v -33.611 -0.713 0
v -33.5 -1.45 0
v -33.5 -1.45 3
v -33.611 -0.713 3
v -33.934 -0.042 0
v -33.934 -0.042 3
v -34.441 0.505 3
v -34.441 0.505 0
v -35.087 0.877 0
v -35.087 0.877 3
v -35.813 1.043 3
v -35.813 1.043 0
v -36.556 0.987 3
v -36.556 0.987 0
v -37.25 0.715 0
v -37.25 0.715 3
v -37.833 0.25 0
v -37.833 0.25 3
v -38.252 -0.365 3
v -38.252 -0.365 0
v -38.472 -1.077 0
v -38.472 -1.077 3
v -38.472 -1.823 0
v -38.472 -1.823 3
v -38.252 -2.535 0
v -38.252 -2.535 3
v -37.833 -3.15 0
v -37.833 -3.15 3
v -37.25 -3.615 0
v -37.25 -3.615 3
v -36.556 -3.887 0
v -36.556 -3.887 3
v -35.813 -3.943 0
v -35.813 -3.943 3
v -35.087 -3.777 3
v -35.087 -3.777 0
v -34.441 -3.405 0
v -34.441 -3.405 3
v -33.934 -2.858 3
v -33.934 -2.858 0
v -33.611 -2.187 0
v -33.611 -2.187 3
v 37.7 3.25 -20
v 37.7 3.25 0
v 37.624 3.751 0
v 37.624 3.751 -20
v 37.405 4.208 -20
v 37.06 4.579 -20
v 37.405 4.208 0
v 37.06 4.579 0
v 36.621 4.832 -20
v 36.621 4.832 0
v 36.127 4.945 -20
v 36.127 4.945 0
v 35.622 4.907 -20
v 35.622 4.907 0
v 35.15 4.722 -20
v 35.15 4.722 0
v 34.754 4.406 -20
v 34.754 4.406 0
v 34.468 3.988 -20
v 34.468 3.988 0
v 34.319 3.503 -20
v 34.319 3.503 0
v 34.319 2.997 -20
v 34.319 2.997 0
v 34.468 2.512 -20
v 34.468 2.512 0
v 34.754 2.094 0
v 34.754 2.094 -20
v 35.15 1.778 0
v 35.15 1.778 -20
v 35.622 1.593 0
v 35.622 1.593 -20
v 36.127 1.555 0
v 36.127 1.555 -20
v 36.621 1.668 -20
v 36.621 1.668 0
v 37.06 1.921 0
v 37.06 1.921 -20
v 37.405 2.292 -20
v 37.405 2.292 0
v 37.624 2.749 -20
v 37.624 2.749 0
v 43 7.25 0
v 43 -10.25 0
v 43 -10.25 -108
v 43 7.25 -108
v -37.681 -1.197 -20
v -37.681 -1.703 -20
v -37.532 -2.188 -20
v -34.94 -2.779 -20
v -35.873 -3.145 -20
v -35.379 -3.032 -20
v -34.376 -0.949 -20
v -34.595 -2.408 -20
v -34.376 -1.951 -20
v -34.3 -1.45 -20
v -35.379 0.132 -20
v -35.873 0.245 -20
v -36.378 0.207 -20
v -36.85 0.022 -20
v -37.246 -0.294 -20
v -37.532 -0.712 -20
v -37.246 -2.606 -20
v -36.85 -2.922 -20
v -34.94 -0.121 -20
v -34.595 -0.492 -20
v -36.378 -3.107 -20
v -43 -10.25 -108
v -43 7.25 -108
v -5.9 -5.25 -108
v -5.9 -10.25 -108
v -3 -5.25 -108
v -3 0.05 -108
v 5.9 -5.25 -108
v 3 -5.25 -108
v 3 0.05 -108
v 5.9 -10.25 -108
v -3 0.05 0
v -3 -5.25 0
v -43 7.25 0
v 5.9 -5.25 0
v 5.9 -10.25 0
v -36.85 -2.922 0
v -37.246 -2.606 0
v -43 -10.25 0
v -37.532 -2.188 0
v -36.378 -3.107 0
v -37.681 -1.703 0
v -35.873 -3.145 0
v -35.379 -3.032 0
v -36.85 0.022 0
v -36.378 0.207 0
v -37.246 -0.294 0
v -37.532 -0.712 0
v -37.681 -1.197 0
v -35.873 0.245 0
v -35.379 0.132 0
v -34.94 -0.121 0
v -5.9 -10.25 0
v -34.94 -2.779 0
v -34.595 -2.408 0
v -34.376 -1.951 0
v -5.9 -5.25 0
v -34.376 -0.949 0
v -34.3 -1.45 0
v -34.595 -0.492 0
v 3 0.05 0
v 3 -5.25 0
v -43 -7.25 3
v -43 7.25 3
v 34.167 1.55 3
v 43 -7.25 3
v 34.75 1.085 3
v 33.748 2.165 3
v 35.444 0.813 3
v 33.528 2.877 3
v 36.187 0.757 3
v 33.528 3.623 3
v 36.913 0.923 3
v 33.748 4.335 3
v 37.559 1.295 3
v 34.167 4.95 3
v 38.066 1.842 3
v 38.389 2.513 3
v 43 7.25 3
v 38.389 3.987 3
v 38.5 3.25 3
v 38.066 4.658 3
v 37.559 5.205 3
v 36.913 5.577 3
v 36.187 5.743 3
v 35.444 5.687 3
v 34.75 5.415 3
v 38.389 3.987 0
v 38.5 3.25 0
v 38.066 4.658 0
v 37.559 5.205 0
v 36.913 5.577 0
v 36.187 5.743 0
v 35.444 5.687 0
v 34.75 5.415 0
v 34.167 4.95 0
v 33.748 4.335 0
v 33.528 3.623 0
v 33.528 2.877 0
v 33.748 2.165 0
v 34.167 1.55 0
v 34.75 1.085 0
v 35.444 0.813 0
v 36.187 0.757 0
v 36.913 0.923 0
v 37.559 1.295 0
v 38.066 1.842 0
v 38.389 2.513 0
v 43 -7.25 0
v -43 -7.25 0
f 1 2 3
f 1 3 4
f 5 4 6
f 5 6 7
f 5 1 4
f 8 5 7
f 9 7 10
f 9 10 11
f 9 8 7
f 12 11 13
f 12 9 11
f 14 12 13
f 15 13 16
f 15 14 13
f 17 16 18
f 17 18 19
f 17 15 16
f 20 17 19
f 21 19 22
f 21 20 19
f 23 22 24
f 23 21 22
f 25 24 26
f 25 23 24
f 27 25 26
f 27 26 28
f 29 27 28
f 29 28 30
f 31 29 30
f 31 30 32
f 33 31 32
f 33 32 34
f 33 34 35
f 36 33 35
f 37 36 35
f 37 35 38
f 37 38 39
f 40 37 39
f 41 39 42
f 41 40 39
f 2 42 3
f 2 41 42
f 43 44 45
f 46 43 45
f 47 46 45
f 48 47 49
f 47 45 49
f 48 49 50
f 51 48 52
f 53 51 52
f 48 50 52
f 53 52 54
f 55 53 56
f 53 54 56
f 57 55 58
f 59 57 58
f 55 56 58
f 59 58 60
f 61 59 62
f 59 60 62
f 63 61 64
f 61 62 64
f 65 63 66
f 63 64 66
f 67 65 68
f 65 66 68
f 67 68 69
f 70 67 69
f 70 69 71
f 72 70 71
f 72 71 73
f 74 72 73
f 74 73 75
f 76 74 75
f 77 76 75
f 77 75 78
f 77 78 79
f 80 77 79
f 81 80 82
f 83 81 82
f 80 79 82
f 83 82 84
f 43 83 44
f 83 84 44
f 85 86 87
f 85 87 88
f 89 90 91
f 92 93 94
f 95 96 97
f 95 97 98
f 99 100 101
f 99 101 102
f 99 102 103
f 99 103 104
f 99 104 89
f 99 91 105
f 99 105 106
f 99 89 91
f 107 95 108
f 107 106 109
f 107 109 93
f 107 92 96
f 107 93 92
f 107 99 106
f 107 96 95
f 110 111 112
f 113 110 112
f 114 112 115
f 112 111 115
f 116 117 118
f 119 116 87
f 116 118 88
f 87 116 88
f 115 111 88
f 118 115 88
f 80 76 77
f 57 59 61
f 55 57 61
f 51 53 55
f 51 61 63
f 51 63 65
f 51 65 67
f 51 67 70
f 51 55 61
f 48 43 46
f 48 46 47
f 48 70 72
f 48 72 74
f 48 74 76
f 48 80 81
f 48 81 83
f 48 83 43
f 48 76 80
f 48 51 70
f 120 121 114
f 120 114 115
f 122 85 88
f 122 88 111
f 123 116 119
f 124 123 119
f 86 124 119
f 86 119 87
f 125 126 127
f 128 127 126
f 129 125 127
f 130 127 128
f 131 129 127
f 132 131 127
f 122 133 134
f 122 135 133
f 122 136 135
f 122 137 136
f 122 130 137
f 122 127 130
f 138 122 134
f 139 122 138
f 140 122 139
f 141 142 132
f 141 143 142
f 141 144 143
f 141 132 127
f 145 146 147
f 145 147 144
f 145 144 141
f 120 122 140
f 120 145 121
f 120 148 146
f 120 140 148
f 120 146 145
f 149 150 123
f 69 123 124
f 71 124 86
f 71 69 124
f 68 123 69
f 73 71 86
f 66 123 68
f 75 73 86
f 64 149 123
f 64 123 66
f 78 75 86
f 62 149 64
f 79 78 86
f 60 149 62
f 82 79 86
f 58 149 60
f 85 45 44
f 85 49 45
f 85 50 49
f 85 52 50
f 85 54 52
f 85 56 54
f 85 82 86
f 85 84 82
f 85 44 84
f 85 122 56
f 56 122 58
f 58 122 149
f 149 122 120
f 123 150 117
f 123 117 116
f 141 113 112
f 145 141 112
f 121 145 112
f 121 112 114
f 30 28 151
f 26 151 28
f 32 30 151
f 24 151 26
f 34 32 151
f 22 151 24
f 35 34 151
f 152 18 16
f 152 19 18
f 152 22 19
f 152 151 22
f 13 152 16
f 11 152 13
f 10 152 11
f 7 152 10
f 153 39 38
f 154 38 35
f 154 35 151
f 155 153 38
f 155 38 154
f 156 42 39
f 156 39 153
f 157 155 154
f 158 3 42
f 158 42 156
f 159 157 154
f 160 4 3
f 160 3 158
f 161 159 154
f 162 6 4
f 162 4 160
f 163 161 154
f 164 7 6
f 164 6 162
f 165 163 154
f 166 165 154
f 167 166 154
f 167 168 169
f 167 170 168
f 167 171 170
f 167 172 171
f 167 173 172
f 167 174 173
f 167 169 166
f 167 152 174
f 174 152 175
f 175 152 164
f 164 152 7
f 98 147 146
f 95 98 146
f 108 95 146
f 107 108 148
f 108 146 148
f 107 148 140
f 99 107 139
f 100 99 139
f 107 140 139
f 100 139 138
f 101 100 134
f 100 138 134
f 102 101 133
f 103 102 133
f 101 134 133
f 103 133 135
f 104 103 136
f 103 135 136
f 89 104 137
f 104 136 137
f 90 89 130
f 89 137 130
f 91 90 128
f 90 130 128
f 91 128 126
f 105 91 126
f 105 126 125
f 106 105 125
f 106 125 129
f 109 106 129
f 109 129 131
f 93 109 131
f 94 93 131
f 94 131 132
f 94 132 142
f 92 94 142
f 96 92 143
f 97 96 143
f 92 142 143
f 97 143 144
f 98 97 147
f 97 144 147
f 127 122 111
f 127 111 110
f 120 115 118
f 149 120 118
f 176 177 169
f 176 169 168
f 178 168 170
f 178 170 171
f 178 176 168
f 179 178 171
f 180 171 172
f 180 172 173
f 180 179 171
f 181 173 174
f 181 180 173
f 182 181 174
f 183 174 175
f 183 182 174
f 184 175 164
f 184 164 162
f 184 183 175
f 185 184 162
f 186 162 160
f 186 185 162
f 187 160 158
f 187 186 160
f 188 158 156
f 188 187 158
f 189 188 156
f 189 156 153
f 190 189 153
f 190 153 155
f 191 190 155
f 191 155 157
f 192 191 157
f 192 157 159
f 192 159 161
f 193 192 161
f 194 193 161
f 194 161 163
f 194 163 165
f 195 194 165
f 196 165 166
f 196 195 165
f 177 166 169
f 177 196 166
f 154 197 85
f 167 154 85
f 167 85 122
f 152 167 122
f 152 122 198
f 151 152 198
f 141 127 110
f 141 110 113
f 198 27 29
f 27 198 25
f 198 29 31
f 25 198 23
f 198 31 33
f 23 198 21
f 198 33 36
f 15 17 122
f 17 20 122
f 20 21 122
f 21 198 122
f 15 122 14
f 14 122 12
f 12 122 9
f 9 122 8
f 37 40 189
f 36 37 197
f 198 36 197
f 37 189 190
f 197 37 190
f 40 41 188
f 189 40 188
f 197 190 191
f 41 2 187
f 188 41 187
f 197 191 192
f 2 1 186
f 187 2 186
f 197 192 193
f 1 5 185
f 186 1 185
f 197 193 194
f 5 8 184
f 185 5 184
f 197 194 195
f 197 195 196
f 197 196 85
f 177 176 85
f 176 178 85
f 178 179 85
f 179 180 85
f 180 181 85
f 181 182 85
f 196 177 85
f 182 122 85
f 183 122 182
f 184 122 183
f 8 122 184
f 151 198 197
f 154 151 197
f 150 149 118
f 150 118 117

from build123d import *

# Parameters (mm, degrees)
F0_R     = 2.5
F0_W     = 2.9
F0_H     = 2
F0_W_2   = 6
F0_H_2   = 5.3
F1_DEPTH = 3
F0_W_3   = 37.1
F0_H_3   = 3
F0_R_2   = 1.7
F2_DEPTH = 108
F3_DEPTH = 20


with BuildPart() as f1:
    # F0 (on Top) → F1 (new body)
    with BuildSketch(Plane.XY):
        Polygon((5.9, -7.25), (43, -7.25), (43, 7.25), (-43, 7.25), (-43, -7.25), (-5.9, -7.25), (-5.9, -5.25), (-3, -5.25), (-3, 0.05), (3, 0.05), (3, -5.25), (5.9, -5.25), align=None)
        with Locations((-36, -1.45)):
            Circle(F0_R, mode=Mode.SUBTRACT)
        with Locations((36, 3.25)):
            Circle(F0_R, mode=Mode.SUBTRACT)
        with Locations((-4.45, -6.25)):
            Rectangle(F0_W, F0_H)
        with Locations((0, -6.25)):
            Rectangle(F0_W_2, F0_H)
        with Locations((0, -2.6)):
            Rectangle(F0_W_2, F0_H_2)
        with Locations((4.45, -6.25)):
            Rectangle(F0_W, F0_H)
    extrude(amount=F1_DEPTH)


with BuildPart() as f2:
    # F0 (on Top) → F2 (new body)
    with BuildSketch(Plane.XY):
        Polygon((5.9, -7.25), (43, -7.25), (43, 7.25), (-43, 7.25), (-43, -7.25), (-5.9, -7.25), (-5.9, -5.25), (-3, -5.25), (-3, 0.05), (3, 0.05), (3, -5.25), (5.9, -5.25), align=None)
        with Locations((-36, -1.45)):
            Circle(F0_R, mode=Mode.SUBTRACT)
        with Locations((36, 3.25)):
            Circle(F0_R, mode=Mode.SUBTRACT)
        with Locations((-24.45, -8.75)):
            Rectangle(F0_W_3, F0_H_3)
        with Locations((24.45, -8.75)):
            Rectangle(F0_W_3, F0_H_3)
        with Locations((-36, -1.45)):
            Circle(F0_R)
        with Locations((-36, -1.45)):
            Circle(F0_R_2, mode=Mode.SUBTRACT)
        with Locations((36, 3.25)):
            Circle(F0_R)
        with Locations((36, 3.25)):
            Circle(F0_R_2, mode=Mode.SUBTRACT)
        with Locations((36, 3.25)):
            Circle(F0_R_2)
        with Locations((-36, -1.45)):
            Circle(F0_R_2)
    extrude(amount=-F2_DEPTH)

    # F0 (on Top) → F3 (cut)
    with BuildSketch(Plane.XY):
        with Locations((-36, -1.45)):
            Circle(F0_R_2)
        with Locations((36, 3.25)):
            Circle(F0_R_2)
    extrude(amount=-F3_DEPTH, mode=Mode.SUBTRACT)


solid = Compound([f1.part, f2.part])
